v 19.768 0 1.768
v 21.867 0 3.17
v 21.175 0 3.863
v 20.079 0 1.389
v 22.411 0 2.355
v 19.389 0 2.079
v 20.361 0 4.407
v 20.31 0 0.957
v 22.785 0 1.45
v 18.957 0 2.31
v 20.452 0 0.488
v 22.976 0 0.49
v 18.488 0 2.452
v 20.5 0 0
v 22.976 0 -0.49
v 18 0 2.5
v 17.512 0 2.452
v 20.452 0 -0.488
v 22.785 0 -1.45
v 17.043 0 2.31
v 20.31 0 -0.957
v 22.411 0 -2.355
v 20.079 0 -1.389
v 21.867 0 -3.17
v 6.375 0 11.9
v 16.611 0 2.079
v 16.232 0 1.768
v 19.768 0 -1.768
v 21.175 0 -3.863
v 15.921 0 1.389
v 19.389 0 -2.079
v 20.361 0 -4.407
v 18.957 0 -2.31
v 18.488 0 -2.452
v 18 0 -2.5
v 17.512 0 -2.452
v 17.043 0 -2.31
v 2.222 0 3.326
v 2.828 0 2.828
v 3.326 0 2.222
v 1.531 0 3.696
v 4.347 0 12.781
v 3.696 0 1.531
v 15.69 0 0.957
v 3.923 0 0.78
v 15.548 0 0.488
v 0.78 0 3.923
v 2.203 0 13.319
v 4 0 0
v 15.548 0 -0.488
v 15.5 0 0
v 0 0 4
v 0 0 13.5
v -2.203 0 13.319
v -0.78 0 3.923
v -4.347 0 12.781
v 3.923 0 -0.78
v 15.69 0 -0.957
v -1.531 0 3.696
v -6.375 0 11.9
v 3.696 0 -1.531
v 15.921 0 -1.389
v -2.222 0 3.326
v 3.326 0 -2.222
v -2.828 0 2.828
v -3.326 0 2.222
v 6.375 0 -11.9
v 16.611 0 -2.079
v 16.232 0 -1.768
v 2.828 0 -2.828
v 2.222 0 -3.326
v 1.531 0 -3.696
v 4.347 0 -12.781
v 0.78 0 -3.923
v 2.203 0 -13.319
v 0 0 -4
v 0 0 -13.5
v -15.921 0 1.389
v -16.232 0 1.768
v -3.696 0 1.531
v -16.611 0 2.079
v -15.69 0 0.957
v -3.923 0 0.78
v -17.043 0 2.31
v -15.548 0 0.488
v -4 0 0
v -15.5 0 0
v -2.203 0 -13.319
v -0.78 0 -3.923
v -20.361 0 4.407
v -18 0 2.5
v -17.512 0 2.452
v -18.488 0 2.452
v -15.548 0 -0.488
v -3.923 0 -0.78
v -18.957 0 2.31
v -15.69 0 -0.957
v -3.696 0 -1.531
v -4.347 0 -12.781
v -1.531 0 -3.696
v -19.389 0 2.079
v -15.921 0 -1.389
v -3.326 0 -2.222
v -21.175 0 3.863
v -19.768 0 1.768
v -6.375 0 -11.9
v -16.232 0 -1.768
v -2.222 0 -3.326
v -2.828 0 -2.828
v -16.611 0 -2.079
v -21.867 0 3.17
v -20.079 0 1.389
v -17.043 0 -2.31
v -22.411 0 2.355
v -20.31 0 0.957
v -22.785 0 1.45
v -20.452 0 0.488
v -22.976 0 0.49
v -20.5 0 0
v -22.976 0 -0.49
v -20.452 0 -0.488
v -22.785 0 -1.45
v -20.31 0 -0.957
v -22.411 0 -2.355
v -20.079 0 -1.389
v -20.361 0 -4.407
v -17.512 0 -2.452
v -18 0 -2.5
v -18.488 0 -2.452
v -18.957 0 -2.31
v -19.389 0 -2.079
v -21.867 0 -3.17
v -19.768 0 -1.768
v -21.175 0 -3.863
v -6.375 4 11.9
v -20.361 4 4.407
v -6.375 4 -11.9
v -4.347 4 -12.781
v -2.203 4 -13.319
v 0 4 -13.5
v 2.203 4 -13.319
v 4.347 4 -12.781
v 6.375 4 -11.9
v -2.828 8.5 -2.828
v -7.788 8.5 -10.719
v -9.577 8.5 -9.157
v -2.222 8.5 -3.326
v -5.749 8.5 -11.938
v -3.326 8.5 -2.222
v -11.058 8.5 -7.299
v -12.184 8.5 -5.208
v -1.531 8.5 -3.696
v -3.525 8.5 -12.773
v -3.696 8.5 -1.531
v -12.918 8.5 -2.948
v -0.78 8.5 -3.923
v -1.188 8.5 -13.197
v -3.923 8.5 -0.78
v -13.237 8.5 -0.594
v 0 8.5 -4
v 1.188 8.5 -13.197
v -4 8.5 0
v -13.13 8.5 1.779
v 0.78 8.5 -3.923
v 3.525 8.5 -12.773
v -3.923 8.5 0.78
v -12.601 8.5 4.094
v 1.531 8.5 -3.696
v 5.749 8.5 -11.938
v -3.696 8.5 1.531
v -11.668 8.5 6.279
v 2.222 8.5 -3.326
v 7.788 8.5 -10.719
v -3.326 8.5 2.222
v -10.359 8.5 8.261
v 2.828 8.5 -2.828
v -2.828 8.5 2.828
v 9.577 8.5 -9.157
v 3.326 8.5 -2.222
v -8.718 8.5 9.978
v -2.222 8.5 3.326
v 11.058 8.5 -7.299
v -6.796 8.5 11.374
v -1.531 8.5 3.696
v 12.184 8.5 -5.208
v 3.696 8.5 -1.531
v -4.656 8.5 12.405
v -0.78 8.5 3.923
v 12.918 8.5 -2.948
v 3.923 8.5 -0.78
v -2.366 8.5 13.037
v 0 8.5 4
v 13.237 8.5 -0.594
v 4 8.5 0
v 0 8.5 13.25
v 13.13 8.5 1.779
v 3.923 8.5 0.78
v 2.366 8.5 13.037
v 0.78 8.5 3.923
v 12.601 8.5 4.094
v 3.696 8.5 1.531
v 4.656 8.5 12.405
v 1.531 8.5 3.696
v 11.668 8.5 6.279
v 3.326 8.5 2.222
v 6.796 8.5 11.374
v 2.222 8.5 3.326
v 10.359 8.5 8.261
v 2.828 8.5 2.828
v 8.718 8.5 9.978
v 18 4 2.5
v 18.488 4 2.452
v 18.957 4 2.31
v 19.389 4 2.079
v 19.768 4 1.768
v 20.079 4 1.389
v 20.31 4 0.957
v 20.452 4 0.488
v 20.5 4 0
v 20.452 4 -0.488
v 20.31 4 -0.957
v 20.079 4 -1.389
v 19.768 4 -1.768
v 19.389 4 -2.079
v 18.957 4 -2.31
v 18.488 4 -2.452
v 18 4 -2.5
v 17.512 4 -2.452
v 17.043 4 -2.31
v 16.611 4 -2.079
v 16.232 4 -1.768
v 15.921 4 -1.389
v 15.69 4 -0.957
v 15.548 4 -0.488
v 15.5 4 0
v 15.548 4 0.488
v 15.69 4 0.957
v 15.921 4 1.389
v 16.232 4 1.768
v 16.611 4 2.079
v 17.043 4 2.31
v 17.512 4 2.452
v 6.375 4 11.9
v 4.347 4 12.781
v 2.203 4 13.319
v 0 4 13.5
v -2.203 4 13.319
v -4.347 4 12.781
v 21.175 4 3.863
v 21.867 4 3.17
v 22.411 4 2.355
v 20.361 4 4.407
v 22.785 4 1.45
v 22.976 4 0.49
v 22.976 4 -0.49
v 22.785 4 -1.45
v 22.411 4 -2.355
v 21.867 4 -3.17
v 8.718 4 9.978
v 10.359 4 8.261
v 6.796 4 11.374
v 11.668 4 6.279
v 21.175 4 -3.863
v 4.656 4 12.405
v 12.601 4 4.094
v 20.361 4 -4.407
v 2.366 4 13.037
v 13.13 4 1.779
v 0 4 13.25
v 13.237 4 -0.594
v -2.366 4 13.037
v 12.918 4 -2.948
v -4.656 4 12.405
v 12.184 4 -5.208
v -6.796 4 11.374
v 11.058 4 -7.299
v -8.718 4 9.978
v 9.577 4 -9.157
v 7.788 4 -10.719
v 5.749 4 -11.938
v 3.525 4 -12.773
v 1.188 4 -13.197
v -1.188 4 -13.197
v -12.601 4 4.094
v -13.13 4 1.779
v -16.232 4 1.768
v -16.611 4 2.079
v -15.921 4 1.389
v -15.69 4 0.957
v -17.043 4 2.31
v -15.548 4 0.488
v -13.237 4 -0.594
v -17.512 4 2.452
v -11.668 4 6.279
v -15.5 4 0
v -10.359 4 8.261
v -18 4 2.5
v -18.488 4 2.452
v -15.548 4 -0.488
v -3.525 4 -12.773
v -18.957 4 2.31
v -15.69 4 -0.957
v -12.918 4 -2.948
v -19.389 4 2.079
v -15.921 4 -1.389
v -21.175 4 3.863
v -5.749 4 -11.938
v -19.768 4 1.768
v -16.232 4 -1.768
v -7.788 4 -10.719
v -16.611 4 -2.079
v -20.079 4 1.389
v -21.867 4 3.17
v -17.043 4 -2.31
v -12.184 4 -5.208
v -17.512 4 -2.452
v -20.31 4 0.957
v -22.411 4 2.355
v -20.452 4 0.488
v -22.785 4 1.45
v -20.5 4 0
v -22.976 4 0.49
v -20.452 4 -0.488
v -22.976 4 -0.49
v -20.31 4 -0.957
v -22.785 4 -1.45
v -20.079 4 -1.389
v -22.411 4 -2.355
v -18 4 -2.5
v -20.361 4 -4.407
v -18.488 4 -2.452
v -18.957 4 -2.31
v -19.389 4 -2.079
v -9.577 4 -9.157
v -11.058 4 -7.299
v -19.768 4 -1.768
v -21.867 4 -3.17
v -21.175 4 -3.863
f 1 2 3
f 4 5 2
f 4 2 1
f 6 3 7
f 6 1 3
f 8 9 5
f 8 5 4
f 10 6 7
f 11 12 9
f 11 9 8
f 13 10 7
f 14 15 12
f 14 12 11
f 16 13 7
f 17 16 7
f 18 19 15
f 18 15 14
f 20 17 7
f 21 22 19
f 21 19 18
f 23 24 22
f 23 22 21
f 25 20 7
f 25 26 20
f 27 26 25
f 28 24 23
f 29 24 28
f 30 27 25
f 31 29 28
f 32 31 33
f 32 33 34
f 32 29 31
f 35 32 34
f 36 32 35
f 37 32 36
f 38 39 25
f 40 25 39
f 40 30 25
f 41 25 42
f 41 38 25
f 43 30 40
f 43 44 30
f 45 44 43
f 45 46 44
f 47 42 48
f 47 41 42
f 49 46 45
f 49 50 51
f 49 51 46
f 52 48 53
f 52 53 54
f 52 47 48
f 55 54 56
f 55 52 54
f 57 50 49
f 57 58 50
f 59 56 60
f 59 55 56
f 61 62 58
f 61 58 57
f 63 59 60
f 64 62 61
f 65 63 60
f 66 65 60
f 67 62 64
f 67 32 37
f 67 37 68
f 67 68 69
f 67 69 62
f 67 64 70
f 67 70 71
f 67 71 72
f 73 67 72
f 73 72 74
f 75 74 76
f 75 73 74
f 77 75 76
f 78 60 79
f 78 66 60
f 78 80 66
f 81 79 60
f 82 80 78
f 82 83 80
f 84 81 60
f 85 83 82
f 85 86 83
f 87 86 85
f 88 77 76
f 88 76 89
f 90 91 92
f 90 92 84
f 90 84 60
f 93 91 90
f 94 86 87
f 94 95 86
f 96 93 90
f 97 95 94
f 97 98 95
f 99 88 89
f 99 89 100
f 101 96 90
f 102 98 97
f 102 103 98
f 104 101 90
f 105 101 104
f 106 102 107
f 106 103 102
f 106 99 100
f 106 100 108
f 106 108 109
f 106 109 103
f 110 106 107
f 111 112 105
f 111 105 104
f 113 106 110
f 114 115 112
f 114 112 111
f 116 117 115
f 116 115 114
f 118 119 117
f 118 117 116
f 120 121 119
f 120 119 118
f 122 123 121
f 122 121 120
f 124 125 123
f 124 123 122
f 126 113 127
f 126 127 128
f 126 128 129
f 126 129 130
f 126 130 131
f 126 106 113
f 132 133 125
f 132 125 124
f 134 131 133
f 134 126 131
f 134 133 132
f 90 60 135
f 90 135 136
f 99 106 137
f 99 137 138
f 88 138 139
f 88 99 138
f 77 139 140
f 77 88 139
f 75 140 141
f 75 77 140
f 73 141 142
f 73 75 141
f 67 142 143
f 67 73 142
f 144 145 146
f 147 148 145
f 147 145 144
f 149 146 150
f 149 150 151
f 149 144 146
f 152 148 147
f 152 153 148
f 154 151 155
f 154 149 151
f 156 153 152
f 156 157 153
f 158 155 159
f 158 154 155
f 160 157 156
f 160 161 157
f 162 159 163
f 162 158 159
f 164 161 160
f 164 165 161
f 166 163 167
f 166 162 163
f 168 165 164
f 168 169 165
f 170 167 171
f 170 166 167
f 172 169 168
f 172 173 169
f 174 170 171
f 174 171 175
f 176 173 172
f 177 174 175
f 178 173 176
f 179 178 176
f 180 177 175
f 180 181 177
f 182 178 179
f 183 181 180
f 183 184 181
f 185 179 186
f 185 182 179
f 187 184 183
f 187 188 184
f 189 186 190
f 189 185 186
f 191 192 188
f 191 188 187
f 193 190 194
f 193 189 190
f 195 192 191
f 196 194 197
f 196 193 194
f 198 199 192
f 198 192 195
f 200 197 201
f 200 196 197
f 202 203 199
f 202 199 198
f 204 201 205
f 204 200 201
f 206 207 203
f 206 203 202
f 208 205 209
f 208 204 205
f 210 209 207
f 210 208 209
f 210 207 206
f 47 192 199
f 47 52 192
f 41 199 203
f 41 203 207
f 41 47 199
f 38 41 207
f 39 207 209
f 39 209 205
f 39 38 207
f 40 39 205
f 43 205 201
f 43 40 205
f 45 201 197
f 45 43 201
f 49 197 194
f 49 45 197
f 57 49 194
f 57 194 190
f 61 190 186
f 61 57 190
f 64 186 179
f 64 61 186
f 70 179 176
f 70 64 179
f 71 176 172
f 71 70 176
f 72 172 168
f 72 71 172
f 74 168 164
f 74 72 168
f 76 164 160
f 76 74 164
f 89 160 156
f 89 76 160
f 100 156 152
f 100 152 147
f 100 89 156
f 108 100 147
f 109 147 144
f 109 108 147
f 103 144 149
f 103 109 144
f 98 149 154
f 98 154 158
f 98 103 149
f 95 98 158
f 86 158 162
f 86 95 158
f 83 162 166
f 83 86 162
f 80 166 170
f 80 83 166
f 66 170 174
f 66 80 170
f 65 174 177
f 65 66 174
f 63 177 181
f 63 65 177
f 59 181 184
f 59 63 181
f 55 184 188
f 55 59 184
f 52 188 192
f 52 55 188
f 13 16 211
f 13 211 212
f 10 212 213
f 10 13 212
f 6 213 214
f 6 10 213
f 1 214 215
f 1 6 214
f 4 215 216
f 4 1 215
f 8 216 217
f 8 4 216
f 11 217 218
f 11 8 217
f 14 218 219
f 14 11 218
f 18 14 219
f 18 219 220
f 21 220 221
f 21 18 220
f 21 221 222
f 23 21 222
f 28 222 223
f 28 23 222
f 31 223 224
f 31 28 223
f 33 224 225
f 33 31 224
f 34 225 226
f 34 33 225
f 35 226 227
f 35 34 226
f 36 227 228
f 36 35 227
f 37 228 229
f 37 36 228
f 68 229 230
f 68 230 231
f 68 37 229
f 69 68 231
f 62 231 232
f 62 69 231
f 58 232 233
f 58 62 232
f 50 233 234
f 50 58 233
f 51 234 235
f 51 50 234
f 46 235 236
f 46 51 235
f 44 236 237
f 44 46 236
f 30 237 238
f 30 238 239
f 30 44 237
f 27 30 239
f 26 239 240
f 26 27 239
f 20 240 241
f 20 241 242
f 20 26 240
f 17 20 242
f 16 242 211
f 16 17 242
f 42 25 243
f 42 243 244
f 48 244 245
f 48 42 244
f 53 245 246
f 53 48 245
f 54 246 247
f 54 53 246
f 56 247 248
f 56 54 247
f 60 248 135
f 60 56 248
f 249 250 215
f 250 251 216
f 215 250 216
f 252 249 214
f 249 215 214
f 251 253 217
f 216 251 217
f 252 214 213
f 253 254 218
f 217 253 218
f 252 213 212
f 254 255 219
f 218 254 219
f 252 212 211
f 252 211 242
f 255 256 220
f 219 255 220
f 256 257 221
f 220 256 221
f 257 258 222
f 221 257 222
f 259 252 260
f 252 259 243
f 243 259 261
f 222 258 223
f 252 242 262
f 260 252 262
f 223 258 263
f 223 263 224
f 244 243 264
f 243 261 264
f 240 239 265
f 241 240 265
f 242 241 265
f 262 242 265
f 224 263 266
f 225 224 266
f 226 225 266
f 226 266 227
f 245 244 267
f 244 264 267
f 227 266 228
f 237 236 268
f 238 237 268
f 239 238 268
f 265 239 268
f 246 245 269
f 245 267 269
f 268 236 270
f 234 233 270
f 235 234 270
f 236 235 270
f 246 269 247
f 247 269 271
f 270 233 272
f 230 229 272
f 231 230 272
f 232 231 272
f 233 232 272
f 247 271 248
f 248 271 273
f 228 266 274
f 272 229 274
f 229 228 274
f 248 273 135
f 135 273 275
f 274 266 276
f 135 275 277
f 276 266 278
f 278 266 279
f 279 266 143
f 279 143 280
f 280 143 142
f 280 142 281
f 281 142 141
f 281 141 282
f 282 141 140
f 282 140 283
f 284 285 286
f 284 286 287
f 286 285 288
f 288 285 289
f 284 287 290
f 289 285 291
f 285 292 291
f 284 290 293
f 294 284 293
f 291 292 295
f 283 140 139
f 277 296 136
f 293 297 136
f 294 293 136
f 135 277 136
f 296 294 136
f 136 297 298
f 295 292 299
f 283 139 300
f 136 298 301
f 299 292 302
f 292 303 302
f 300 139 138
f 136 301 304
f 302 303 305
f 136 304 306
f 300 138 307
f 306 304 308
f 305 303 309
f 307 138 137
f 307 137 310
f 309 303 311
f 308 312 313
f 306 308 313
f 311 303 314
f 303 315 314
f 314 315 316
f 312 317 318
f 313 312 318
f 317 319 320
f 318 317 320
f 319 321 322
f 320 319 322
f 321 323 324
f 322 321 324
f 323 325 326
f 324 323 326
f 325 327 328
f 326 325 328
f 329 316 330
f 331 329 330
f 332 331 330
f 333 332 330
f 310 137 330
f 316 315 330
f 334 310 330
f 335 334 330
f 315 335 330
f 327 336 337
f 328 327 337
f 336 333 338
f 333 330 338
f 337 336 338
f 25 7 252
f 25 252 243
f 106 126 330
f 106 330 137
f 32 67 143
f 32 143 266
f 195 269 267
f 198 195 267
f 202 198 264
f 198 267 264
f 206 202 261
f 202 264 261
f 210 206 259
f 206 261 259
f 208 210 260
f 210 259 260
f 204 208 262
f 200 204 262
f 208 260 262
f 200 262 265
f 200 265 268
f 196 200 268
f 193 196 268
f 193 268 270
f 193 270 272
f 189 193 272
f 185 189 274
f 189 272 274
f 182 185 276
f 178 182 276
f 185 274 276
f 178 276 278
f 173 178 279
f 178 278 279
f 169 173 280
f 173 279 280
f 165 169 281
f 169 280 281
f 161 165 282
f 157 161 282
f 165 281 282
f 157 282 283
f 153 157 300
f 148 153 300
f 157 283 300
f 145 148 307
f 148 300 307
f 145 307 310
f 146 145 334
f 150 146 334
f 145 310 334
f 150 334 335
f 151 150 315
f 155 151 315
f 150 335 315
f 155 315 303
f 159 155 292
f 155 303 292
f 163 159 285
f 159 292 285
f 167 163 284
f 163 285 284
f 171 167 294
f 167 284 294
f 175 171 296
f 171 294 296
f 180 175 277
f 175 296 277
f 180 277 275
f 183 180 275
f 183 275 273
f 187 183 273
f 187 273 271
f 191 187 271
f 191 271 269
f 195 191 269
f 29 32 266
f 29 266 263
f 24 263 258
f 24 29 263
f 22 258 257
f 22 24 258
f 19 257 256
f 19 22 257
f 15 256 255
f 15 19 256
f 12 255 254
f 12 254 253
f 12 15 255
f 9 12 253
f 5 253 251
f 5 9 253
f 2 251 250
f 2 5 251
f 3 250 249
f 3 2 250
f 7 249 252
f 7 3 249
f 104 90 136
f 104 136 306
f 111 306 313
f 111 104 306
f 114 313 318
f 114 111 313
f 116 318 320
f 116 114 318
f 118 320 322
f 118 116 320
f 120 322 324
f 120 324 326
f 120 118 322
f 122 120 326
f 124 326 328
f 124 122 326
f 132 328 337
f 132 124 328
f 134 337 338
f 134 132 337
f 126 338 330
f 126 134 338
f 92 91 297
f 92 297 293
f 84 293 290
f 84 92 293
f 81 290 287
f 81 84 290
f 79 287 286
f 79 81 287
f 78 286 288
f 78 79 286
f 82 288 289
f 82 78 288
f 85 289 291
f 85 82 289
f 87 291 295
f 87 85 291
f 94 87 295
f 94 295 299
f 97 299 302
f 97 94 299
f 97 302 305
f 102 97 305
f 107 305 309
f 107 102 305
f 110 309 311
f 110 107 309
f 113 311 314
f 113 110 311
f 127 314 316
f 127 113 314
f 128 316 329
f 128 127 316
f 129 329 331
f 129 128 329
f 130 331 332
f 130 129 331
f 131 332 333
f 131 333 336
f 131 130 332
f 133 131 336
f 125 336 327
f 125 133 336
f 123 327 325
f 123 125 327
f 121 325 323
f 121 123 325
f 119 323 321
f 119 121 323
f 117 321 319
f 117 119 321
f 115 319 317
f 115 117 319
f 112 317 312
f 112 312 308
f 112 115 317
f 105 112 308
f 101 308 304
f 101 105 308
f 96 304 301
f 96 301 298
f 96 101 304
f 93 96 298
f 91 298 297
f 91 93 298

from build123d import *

# Parameters (mm, degrees)
SKETCH_1_R      = 4
SKETCH_1_R_2    = 2.5
EXTRUDE_1_DEPTH = 4
SKETCH_2_R      = 13.25
SKETCH_2_R_2    = 4
EXTRUDE_2_DEPTH = 4.5


with BuildPart() as part:
    # 草图1 → 凸台-拉伸1 (new body)
    with BuildSketch(Plane(origin=(0, 0, 0), x_dir=(1, 0, 0), z_dir=(0, 1, 0))):
        with BuildLine():
            Line((20.361111111, -4.407397681), (6.375, -11.899973739))
            ThreePointArc((6.375, -11.899973739), (0, -13.5), (-6.375, -11.899973739))
            Line((-6.375, -11.899973739), (-20.361111111, -4.407397681))
            ThreePointArc((-20.361111111, -4.407397681), (-23, 0), (-20.361111111, 4.407397681))
            Line((-20.361111111, 4.407397681), (-6.375, 11.899973739))
            ThreePointArc((-6.375, 11.899973739), (0, 13.5), (6.375, 11.899973739))
            Line((6.375, 11.899973739), (20.361111111, 4.407397681))
            ThreePointArc((20.361111111, 4.407397681), (23, 0), (20.361111111, -4.407397681))
        make_face()
        with Locations(Location((0, 0, 0), (0, 0, 270))):
            Circle(SKETCH_1_R, mode=Mode.SUBTRACT)
        with Locations(Location((18, 0, 0), (0, 0, 270))):
            Circle(SKETCH_1_R_2, mode=Mode.SUBTRACT)
        with Locations(Location((-18, 0, 0), (0, 0, 270))):
            Circle(SKETCH_1_R_2, mode=Mode.SUBTRACT)
    extrude(amount=EXTRUDE_1_DEPTH)

    # 草图2 → 凸台-拉伸2 (add)
    with BuildSketch(Plane(origin=(0, 4, 0), x_dir=(1, 0, 0), z_dir=(0, 1, 0))):
        with Locations(Location((0, 0, 0), (0, 0, 270))):
            Circle(SKETCH_2_R)
        with Locations(Location((0, 0, 0), (0, 0, 270))):
            Circle(SKETCH_2_R_2, mode=Mode.SUBTRACT)
    extrude(amount=EXTRUDE_2_DEPTH)


solid = part.part
